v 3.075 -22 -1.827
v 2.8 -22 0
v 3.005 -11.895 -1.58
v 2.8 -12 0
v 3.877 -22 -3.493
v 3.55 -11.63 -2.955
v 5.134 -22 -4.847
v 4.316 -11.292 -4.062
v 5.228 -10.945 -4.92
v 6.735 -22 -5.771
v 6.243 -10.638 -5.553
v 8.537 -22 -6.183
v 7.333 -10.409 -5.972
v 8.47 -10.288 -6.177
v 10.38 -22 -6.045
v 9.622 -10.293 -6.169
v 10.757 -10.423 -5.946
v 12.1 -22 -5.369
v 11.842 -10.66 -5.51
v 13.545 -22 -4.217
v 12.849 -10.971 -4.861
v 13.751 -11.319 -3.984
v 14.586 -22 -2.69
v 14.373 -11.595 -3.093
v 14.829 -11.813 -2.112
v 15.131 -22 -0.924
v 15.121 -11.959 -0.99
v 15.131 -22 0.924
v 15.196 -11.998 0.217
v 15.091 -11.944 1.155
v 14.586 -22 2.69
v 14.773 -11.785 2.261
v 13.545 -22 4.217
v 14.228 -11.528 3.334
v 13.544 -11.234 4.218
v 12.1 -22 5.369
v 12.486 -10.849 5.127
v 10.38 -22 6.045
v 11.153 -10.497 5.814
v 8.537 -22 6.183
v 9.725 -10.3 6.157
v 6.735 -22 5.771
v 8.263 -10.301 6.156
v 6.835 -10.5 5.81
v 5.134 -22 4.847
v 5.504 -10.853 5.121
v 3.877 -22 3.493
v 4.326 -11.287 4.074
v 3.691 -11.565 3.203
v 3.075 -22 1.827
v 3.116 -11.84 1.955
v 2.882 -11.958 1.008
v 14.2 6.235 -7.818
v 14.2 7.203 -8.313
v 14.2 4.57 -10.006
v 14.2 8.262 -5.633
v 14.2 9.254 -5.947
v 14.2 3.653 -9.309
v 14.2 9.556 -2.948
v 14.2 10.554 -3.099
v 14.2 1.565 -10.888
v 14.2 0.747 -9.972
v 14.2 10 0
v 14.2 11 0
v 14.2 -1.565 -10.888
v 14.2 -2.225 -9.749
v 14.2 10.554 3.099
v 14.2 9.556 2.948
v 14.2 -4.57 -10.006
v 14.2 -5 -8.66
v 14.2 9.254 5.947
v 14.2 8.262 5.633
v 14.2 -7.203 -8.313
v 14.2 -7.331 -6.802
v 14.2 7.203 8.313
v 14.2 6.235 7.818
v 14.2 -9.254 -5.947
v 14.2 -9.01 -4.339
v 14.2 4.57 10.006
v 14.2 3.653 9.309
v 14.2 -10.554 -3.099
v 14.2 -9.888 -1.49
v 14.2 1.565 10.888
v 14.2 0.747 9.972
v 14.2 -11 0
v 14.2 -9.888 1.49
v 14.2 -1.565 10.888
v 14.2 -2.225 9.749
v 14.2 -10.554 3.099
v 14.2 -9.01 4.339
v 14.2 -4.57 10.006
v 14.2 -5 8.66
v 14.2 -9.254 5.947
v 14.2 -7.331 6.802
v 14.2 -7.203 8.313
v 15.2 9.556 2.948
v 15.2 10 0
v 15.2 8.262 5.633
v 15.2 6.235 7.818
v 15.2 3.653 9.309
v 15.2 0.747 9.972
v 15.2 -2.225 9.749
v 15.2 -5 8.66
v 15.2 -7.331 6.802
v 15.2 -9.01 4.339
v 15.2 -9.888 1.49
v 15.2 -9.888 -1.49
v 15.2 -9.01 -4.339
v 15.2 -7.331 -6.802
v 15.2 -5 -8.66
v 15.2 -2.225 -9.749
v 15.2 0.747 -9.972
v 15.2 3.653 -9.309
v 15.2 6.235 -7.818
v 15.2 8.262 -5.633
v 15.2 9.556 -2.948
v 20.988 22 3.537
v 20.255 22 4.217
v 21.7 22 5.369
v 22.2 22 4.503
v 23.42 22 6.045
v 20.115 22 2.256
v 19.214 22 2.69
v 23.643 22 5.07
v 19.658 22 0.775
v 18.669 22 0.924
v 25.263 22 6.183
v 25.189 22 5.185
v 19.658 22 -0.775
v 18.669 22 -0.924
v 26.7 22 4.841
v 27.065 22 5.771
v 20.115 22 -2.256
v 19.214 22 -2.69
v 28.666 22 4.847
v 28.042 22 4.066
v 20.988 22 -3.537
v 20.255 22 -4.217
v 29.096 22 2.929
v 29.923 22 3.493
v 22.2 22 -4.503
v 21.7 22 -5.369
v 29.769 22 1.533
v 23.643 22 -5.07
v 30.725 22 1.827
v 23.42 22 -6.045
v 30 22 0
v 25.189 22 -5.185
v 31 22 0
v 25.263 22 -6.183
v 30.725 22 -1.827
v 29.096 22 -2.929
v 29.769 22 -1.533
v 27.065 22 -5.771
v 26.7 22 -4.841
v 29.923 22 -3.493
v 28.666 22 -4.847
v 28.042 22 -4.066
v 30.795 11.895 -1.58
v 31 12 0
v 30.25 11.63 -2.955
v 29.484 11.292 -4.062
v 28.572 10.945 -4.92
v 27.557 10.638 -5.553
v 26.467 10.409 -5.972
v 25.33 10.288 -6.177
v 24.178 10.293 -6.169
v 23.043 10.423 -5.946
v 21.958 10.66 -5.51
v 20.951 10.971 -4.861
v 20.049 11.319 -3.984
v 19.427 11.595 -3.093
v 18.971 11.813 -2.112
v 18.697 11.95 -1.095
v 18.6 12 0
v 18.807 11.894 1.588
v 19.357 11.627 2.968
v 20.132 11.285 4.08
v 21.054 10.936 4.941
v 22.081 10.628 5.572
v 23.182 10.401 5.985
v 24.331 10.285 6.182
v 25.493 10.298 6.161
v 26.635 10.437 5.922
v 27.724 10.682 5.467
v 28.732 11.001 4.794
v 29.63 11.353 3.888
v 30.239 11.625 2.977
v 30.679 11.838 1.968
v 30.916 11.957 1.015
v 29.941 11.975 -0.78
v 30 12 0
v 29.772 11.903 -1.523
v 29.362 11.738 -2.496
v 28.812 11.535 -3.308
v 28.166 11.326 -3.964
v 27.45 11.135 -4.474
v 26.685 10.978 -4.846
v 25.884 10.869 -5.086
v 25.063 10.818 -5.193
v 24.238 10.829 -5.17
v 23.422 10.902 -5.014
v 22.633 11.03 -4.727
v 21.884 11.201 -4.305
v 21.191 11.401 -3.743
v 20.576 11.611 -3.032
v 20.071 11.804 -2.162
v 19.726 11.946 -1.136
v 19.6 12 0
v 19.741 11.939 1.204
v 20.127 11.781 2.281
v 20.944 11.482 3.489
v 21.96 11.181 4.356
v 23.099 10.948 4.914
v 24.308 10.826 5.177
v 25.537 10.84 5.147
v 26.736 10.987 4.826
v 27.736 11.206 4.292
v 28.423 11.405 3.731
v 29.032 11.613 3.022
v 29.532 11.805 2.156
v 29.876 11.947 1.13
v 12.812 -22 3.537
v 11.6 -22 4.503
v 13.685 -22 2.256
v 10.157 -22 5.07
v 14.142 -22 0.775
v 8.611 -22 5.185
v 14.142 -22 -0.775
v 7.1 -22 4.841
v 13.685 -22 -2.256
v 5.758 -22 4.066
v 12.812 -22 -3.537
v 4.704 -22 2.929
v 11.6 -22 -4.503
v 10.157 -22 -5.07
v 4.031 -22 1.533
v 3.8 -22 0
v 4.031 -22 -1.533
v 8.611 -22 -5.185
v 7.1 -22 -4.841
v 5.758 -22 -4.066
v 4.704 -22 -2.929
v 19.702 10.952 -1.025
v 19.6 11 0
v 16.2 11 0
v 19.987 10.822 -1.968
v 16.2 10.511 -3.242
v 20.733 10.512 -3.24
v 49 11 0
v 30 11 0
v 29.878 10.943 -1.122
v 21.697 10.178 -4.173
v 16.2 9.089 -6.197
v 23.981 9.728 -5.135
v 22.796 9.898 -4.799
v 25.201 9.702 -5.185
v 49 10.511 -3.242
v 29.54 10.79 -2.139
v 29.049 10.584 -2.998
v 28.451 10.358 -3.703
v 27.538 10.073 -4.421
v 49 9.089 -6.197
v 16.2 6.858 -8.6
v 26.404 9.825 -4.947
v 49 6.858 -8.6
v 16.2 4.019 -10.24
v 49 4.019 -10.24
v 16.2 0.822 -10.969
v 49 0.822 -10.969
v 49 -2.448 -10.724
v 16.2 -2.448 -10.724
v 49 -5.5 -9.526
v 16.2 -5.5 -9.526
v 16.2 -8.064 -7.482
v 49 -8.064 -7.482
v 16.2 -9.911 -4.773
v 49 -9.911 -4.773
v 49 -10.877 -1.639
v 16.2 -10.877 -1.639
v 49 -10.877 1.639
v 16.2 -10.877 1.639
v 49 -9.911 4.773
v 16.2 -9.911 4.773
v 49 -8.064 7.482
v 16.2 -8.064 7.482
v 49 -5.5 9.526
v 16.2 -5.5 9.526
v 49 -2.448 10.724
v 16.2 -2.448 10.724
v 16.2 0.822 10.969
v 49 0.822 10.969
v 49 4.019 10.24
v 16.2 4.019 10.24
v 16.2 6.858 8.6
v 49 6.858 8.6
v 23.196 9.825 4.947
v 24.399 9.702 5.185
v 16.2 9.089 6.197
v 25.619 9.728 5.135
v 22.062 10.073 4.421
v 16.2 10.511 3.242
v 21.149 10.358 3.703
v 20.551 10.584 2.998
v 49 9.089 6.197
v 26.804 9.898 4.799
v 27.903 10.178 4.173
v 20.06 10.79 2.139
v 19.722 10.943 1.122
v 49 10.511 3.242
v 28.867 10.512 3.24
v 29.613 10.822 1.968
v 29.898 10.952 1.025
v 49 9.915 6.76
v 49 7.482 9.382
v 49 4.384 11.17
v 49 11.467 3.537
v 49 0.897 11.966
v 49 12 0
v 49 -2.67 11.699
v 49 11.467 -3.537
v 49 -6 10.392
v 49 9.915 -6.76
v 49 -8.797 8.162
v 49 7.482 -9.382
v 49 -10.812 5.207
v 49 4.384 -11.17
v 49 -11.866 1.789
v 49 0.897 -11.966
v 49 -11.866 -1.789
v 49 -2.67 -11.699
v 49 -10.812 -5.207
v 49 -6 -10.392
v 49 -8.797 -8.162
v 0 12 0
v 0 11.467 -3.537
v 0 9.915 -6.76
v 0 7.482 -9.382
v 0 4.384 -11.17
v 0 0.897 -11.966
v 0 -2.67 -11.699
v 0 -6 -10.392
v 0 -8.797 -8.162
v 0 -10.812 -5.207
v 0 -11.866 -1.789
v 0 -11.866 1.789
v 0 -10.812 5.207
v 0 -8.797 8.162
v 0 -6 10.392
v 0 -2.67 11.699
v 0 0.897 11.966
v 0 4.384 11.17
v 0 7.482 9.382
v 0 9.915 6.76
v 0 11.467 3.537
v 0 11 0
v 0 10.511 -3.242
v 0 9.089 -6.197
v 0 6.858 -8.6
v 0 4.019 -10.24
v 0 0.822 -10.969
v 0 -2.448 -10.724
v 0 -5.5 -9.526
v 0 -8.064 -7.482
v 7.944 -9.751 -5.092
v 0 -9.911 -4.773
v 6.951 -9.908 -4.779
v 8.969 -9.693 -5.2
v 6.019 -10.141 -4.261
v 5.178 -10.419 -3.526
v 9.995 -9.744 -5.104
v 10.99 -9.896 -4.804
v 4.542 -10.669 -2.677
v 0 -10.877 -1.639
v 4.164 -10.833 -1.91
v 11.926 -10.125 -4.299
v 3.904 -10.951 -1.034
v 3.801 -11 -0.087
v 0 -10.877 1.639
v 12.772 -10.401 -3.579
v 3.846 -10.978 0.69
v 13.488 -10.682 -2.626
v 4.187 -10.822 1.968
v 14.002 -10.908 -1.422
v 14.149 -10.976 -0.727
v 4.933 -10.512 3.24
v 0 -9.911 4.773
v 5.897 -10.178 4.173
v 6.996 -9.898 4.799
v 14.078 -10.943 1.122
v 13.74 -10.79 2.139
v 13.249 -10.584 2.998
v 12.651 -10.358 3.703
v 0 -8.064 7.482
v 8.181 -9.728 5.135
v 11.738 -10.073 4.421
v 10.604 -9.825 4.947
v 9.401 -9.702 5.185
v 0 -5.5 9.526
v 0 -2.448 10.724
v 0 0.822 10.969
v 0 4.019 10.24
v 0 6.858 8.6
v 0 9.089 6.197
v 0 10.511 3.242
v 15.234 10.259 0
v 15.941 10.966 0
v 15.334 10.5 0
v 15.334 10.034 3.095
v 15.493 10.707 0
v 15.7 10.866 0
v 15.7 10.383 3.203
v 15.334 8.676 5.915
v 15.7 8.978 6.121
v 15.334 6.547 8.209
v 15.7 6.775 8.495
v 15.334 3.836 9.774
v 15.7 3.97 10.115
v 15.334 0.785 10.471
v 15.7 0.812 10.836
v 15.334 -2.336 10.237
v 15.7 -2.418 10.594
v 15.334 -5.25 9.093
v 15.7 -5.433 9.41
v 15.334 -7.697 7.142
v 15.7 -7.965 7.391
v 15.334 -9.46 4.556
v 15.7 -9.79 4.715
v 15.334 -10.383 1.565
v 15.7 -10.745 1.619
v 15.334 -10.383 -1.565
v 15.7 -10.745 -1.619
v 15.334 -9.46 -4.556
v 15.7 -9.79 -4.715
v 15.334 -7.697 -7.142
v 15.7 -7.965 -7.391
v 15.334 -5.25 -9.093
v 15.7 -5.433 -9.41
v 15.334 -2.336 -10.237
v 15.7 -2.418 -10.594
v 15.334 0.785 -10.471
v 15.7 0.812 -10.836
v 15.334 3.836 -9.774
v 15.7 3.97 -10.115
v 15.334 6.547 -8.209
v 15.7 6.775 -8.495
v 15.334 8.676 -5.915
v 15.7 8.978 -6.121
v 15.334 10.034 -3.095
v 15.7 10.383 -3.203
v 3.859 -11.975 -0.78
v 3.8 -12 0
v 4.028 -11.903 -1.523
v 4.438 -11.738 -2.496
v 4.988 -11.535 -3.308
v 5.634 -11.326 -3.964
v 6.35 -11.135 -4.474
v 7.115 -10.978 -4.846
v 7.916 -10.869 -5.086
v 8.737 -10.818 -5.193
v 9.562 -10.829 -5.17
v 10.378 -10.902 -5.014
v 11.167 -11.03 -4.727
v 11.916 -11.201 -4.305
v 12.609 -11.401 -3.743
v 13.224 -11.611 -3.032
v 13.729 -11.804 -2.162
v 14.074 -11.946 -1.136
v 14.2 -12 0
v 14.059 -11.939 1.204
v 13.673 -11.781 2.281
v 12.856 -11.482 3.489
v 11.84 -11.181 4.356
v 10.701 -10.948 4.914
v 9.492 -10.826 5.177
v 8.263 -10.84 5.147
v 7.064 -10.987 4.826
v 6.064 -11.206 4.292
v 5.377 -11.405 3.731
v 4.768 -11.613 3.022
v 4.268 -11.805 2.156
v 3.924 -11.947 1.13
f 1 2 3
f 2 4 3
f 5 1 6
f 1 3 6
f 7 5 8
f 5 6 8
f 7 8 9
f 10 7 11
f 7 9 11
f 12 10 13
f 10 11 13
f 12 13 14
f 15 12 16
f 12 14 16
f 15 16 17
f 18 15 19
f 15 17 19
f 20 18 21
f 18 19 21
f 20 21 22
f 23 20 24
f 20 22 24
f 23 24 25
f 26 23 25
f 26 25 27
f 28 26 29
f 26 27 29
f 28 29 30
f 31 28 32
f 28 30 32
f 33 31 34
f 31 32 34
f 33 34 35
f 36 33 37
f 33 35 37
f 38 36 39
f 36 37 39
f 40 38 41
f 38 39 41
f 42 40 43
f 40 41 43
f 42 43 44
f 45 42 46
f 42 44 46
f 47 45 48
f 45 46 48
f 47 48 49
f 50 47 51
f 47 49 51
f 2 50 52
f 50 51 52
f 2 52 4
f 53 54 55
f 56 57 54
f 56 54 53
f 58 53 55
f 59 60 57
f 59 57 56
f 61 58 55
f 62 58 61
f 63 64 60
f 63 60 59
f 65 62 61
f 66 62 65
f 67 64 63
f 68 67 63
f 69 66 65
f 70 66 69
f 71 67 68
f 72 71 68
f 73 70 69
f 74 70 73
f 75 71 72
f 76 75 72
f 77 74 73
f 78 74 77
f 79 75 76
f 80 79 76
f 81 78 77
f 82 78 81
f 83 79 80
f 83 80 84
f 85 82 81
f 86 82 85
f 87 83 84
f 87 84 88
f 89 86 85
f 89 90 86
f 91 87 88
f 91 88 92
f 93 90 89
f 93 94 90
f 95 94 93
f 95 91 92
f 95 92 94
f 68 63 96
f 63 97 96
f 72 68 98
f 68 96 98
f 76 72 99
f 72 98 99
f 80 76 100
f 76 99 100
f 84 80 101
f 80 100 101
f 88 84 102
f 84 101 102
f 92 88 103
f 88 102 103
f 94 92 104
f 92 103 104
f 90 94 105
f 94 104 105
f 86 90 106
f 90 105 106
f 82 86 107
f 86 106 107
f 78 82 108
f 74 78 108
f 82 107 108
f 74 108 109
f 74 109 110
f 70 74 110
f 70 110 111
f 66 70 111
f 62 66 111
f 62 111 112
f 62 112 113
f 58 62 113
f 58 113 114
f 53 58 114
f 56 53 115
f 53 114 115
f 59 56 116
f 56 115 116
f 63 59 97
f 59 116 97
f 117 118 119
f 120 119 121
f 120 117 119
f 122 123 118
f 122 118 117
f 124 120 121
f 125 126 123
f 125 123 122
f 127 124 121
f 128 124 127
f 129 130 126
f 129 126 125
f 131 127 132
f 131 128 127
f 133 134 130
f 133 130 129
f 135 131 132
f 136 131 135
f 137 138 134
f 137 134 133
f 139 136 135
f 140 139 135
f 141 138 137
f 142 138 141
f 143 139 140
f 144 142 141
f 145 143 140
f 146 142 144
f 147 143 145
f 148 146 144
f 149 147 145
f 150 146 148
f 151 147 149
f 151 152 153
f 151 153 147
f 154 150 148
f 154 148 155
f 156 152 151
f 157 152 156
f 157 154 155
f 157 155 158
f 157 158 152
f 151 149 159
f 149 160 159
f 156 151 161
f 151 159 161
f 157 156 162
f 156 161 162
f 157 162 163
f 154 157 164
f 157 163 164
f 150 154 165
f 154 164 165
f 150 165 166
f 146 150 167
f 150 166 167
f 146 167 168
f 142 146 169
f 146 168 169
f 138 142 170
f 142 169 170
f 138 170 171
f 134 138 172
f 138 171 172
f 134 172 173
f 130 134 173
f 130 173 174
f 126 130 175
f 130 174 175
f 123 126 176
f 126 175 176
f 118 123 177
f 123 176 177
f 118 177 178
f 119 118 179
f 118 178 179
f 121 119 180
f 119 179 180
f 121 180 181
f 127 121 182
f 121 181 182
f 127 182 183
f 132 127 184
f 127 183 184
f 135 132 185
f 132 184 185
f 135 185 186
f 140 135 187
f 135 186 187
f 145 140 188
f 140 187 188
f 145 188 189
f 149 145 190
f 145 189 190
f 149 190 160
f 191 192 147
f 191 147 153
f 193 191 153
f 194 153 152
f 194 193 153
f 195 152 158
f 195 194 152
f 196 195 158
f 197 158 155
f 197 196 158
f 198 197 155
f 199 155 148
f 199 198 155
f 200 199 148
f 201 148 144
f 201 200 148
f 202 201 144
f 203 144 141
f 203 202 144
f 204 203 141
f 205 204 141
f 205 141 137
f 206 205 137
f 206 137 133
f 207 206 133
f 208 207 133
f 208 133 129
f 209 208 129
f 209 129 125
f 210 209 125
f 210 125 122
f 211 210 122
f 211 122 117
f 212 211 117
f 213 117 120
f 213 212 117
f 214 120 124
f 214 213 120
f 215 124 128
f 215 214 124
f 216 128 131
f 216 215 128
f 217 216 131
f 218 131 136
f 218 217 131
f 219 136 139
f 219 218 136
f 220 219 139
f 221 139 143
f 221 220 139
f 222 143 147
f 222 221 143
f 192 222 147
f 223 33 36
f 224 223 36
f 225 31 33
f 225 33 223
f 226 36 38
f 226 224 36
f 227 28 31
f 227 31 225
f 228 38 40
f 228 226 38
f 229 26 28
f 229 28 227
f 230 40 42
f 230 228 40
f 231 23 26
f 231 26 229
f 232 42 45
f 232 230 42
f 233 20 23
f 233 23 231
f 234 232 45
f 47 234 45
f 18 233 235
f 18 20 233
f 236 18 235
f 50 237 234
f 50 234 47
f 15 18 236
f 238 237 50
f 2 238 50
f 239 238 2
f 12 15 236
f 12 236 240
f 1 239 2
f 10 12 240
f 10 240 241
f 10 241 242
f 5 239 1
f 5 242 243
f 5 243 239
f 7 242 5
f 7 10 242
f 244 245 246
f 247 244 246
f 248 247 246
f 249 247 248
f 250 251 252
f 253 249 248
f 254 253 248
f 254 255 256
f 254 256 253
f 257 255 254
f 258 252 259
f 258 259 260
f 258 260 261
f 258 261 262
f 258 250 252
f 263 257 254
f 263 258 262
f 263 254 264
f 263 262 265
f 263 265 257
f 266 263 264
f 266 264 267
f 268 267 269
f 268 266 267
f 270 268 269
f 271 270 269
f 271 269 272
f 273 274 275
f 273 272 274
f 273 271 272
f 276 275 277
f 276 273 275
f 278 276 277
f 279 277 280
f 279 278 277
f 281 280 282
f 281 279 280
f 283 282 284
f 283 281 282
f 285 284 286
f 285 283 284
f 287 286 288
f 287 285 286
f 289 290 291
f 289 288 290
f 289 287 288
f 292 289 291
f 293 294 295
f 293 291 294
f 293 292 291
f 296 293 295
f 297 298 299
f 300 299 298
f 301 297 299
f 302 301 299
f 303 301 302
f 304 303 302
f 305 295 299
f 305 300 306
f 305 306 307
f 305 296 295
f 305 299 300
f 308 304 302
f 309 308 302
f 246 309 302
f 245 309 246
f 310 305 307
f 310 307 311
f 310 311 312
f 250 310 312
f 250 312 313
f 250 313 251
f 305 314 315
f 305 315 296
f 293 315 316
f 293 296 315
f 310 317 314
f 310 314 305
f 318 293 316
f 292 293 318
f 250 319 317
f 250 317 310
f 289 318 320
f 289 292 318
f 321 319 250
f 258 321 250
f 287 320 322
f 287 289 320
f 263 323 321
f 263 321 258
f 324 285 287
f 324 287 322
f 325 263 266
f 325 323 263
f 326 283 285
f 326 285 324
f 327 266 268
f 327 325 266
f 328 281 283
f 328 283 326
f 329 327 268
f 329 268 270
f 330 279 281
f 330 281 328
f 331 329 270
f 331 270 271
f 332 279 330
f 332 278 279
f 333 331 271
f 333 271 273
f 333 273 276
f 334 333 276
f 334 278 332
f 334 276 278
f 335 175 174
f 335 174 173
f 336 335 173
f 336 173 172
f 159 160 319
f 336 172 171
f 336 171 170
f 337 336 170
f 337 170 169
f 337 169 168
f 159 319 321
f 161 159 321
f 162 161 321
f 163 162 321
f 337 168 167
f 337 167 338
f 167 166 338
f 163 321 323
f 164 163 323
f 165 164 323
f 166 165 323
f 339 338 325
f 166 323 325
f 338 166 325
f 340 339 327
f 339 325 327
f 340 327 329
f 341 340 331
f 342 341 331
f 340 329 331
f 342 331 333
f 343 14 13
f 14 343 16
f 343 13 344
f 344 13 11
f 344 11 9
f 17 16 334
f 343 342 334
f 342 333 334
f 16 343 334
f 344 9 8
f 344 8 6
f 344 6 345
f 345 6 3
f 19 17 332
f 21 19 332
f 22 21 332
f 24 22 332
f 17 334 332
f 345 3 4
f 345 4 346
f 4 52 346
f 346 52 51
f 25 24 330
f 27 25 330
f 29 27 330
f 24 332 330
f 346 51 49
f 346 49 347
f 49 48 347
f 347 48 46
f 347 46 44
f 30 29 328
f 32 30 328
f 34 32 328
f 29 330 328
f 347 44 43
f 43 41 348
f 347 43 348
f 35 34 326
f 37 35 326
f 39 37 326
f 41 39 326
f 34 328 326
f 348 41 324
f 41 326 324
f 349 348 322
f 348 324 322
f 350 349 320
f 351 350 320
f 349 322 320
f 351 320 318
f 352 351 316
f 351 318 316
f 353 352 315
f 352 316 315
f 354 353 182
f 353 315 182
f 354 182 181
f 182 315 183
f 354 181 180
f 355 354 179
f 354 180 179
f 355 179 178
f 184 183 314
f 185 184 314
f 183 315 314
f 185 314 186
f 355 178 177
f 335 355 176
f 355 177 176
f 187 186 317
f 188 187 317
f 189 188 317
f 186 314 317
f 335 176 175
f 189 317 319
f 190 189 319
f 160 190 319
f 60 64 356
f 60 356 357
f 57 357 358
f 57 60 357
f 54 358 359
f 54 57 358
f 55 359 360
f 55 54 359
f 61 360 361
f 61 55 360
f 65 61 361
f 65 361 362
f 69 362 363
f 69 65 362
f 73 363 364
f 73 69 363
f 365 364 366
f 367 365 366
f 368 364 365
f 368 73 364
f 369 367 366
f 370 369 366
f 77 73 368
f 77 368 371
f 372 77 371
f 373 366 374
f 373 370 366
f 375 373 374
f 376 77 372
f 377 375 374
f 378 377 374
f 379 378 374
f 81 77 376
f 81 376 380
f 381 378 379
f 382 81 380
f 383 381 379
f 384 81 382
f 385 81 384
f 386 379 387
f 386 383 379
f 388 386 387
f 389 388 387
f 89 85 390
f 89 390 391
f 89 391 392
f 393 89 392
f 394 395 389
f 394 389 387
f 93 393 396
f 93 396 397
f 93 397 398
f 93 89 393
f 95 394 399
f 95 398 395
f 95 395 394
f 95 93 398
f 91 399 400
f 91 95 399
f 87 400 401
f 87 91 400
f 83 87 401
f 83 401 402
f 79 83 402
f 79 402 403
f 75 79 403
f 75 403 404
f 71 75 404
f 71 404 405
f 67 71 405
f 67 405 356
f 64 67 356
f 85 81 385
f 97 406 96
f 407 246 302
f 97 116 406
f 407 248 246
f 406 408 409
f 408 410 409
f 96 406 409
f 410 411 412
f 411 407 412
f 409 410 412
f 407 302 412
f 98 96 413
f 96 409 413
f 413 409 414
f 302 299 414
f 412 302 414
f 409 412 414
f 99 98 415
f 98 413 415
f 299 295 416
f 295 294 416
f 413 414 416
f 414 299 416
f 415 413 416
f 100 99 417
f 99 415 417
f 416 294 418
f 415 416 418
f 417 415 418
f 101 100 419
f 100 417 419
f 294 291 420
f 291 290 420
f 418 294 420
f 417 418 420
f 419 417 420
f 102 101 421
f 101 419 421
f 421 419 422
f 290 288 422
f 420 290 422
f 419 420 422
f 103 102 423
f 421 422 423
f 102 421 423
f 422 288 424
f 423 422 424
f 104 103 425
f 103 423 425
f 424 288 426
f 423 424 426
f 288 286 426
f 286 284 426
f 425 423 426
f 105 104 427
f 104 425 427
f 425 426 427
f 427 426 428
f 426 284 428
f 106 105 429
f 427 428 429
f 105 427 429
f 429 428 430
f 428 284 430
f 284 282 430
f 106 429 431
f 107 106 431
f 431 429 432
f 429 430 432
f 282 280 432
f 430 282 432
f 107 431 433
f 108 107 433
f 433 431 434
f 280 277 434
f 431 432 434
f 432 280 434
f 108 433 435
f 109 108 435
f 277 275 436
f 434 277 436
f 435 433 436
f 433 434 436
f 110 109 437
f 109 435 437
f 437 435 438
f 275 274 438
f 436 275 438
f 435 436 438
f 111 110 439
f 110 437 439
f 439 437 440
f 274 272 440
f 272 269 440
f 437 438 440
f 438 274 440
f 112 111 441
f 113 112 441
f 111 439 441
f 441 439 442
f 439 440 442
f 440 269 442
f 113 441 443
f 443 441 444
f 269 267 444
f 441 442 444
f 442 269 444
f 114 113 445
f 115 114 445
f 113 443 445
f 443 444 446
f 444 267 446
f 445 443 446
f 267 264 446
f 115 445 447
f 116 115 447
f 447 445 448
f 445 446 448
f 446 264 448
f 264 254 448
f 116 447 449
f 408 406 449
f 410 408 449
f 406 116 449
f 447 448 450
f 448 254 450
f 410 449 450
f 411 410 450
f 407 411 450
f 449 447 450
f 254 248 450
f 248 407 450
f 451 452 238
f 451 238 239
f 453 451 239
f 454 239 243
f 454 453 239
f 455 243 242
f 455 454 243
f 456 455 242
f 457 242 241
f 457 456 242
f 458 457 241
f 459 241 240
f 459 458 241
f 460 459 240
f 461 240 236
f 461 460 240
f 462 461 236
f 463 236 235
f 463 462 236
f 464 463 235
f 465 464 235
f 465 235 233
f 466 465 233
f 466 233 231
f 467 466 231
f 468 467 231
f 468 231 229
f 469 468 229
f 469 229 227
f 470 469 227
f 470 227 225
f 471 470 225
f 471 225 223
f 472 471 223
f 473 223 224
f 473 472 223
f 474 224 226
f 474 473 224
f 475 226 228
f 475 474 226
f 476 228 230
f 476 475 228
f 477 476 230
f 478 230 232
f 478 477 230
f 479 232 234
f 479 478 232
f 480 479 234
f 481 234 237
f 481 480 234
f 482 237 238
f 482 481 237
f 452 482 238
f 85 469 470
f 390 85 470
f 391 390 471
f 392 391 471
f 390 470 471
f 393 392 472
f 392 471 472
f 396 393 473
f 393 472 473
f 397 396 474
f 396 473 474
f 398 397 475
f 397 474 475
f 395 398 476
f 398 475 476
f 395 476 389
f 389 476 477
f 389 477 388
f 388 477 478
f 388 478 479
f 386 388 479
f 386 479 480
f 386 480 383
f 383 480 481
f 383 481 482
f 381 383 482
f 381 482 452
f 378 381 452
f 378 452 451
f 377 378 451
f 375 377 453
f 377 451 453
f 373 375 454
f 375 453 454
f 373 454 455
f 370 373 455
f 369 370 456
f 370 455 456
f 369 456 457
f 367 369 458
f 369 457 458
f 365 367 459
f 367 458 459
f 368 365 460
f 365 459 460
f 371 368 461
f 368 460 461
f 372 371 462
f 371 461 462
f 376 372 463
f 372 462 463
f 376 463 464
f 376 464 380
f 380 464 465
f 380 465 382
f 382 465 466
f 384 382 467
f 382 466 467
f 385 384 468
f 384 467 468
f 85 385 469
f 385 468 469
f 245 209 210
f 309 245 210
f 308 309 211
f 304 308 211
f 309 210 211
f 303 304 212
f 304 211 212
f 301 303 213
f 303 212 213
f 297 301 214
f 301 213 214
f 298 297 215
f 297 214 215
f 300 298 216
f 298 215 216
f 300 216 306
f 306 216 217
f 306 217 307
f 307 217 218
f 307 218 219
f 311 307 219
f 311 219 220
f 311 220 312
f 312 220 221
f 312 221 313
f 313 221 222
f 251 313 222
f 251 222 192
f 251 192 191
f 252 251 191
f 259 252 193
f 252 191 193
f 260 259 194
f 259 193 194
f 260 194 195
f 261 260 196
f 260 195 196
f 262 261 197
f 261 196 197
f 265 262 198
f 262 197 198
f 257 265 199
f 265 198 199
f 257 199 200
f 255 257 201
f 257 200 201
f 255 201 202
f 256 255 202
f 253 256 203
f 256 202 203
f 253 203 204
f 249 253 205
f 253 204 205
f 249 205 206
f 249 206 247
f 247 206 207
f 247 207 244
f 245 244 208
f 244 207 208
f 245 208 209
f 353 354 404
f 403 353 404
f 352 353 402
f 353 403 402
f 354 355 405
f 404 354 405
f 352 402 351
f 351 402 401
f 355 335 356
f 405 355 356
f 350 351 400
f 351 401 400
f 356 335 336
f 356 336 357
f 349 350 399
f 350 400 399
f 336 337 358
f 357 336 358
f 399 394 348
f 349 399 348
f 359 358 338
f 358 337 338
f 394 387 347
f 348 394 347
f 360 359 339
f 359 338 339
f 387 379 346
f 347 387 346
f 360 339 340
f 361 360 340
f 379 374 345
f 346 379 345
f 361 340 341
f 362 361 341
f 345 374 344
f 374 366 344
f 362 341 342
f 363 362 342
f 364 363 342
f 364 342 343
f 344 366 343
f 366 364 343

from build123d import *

# Parameters (mm, degrees)
SCHIZZO1_W                            = 49
SCHIZZO1_H                            = 1
ESTRUSIONE_SOTTILE1_REACH             = 57.866
ESTRUSIONE_SOTTILE1_END_RADIUS        = 12
SCHIZZO2_R                            = 6.2
SCHIZZO2_R_2                          = 5.2
ESTRUSIONE_SOTTILE1_DIRECTION_2_DEPTH = 10
ESTRUSIONE_SOTTILE2_REACH             = 62.836
ESTRUSIONE_SOTTILE2_END_RADIUS        = 12
SCHIZZO3_R                            = 6.2
SCHIZZO3_R_2                          = 5.2
ESTRUSIONE_SOTTILE2_DIRECTION_2_DEPTH = 10
SCHIZZO4_R                            = 5.2
TAGLIO_ESTRUSIONE2_DEPTH              = 15
SCHIZZO5_R                            = 5.2
TAGLIO_ESTRUSIONE3_DEPTH              = 15
SCHIZZO6_W                            = 1
SCHIZZO6_H                            = 1
RACCORDO1_R                           = 1


with BuildPart() as part:
    # Schizzo1 → Rivoluzione-Sottile2 (revolve)
    with BuildSketch(Plane.XY):
        with Locations((24.5, 11.5)):
            Rectangle(SCHIZZO1_W, SCHIZZO1_H)
    revolve(axis=Axis((49, 0, 0), (-1, 0, 0)))

    # Estrusione-Sottile1: up to this cylinder (the profile starts outside it)
    estrusione_sottile1_end = Plane(origin=(15.024638, 0, 0), z_dir=(1, 0, 0)) * Cylinder(ESTRUSIONE_SOTTILE1_END_RADIUS, 140.732, mode=Mode.PRIVATE)
    # Schizzo2 → Estrusione-Sottile1 (add, up to the surface)
    with BuildSketch(Plane(origin=(0, -12, 0), x_dir=(-1, 0, 0), z_dir=(0, -1, 0)), mode=Mode.PRIVATE) as estrusione_sottile1_sk1:
        with Locations((-9, 0)):
            Circle(SCHIZZO2_R)
        with Locations((-9, 0)):
            Circle(SCHIZZO2_R_2, mode=Mode.SUBTRACT)
    estrusione_sottile1_tool1 = extrude(estrusione_sottile1_sk1.sketch, amount=-ESTRUSIONE_SOTTILE1_REACH, mode=Mode.PRIVATE) - estrusione_sottile1_end
    add(estrusione_sottile1_tool1.solids().sort_by_distance((15.024638, -12, 0))[0])
    add(estrusione_sottile1_tool1.solids().sort_by_distance((15.024638, -12, 0))[1])

    # Schizzo2 → Estrusione-Sottile1 direction 2 (add)
    with BuildSketch(Plane(origin=(0, -12, 0), x_dir=(-1, 0, 0), z_dir=(0, -1, 0))):
        with Locations((-9, 0)):
            Circle(SCHIZZO2_R)
        with Locations((-9, 0)):
            Circle(SCHIZZO2_R_2, mode=Mode.SUBTRACT)
    extrude(amount=ESTRUSIONE_SOTTILE1_DIRECTION_2_DEPTH)

    # Estrusione-Sottile2: up to this cylinder (the profile starts outside it)
    estrusione_sottile2_end = Plane(origin=(18.775362, 0, 0), z_dir=(1, 0, 0)) * Cylinder(ESTRUSIONE_SOTTILE2_END_RADIUS, 150.672, mode=Mode.PRIVATE)
    # Schizzo3 → Estrusione-Sottile2 (add, up to the surface)
    with BuildSketch(Plane(origin=(0, 12, 0), x_dir=(1, 0, 0), z_dir=(0, 1, 0)), mode=Mode.PRIVATE) as estrusione_sottile2_sk1:
        with Locations((24.8, 0)):
            Circle(SCHIZZO3_R)
        with Locations((24.8, 0)):
            Circle(SCHIZZO3_R_2, mode=Mode.SUBTRACT)
    estrusione_sottile2_tool1 = extrude(estrusione_sottile2_sk1.sketch, amount=-ESTRUSIONE_SOTTILE2_REACH, mode=Mode.PRIVATE) - estrusione_sottile2_end
    add(estrusione_sottile2_tool1.solids().sort_by_distance((18.775362, 12, 0))[0])
    add(estrusione_sottile2_tool1.solids().sort_by_distance((18.775362, 12, 0))[1])

    # Schizzo3 → Estrusione-Sottile2 direction 2 (add)
    with BuildSketch(Plane(origin=(0, 12, 0), x_dir=(1, 0, 0), z_dir=(0, 1, 0))):
        with Locations((24.8, 0)):
            Circle(SCHIZZO3_R)
        with Locations((24.8, 0)):
            Circle(SCHIZZO3_R_2, mode=Mode.SUBTRACT)
    extrude(amount=ESTRUSIONE_SOTTILE2_DIRECTION_2_DEPTH)

    # Schizzo4 → Taglio-Estrusione2 (cut)
    with BuildSketch(Plane.XZ.offset(22)):
        with Locations((9, 0)):
            Circle(SCHIZZO4_R)
    extrude(amount=-TAGLIO_ESTRUSIONE2_DEPTH, mode=Mode.SUBTRACT)

    # Schizzo5 → Taglio-Estrusione3 (cut)
    with BuildSketch(Plane(origin=(0, 22, 0), x_dir=(1, 0, 0), z_dir=(0, 1, 0))):
        with Locations(Location((24.8, 0, 0), (0, 0, 180))):
            Circle(SCHIZZO5_R)
    extrude(amount=-TAGLIO_ESTRUSIONE3_DEPTH, mode=Mode.SUBTRACT)

    # Schizzo6 → Rivoluzione1 (revolve)
    with BuildSketch(Plane.XY):
        with Locations((14.7, 10.5)):
            Rectangle(SCHIZZO6_W, SCHIZZO6_H)
    revolve(axis=Axis((0, 0, 0), (1, 0, 0)))

    # Raccordo1
    raccordo1_edges = [part.edges().sort_by_distance(p)[0] for p in [
        (15.2, -11, 0),
    ]]
    fillet(raccordo1_edges, radius=RACCORDO1_R - 0.0001)  # a hair under: the kernel refuses the full size


solid = part.part
